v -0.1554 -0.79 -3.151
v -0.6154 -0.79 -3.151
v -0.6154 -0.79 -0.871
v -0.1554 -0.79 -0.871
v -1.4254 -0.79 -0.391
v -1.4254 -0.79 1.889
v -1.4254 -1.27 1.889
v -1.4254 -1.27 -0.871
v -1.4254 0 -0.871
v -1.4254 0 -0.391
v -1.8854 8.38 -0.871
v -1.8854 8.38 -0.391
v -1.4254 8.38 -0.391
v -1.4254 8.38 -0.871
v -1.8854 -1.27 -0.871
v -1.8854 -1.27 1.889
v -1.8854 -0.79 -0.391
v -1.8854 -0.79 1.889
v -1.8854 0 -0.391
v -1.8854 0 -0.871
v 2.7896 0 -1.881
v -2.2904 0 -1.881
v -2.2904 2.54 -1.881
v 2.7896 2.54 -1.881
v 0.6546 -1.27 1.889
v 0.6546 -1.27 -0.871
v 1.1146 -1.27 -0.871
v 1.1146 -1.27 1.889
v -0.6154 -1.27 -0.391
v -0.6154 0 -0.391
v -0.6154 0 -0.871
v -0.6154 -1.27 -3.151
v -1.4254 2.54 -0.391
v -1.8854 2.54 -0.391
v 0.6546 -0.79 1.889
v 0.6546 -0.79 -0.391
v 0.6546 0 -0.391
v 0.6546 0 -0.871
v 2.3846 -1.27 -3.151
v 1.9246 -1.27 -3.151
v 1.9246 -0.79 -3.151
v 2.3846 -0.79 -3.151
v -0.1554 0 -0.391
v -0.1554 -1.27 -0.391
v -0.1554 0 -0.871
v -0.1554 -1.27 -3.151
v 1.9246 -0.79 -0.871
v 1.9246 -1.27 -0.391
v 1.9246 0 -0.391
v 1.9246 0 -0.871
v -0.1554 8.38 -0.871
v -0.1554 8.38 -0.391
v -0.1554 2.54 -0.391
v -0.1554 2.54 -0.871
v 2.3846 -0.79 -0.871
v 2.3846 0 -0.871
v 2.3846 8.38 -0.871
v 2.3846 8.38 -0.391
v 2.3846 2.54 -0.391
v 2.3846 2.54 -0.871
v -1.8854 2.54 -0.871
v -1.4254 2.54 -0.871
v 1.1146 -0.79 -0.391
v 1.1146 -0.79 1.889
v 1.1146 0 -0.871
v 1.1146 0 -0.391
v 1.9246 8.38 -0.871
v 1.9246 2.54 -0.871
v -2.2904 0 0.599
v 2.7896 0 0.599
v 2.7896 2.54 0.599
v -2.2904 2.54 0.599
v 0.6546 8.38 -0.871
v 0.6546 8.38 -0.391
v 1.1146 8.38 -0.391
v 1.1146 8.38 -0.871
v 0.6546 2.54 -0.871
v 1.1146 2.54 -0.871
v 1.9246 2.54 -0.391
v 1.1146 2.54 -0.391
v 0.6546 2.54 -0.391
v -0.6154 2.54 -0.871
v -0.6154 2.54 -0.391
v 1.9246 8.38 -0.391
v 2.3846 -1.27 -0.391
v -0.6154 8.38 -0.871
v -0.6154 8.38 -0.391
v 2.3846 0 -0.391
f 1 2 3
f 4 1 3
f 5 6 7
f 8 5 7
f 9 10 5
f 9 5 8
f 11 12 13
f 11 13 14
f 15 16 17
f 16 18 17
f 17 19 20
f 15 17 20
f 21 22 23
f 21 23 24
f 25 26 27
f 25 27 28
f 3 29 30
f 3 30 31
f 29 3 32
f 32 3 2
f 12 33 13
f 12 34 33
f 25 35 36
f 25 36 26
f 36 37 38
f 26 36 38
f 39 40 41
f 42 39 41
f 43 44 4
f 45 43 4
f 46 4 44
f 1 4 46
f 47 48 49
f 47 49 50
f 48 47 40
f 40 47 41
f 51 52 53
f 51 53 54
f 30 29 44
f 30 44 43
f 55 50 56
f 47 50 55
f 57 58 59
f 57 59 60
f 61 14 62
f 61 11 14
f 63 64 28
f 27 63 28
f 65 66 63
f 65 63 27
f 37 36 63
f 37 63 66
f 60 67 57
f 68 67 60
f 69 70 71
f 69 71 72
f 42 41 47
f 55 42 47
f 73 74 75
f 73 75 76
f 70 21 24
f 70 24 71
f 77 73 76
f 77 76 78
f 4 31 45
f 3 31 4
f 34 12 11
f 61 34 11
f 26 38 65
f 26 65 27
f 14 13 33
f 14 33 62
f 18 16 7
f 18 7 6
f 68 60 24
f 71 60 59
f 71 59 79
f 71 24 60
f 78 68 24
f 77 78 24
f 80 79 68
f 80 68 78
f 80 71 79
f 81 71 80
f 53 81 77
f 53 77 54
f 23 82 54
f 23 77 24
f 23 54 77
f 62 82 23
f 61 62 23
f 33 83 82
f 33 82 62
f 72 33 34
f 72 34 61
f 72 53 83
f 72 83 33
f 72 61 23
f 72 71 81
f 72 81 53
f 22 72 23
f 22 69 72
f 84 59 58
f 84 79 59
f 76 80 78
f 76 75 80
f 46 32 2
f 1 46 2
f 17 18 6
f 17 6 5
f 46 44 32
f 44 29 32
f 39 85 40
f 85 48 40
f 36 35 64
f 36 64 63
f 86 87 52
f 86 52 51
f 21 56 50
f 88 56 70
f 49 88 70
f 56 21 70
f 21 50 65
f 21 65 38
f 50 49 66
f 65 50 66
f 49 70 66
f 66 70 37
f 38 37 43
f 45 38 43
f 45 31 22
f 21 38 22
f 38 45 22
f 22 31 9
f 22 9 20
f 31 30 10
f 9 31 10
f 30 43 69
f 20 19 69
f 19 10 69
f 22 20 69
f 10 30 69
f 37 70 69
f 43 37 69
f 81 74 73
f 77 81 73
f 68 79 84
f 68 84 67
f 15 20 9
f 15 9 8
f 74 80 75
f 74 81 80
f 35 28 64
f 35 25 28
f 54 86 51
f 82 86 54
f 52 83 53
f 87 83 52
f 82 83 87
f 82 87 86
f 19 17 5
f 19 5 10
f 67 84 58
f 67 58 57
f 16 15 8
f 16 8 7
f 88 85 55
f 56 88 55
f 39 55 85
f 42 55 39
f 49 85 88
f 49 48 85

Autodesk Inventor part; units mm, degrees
ref_plane "YZ Plane" through (0, 0, 0) normal (1, 0, 0) x (0, 1, 0)
sketch "Sketch1" plane through (0, 0, 0) normal (0, 1, 0) x (-1, 0, 0)
  line L0 (-2.7896, 0.599) -> (2.2904, 0.599)
  line L1 (2.2904, 0.599) -> (2.2904, -1.881)
  line L2 (2.2904, -1.881) -> (-2.7896, -1.881)
  line L3 (-2.7896, -1.881) -> (-2.7896, 0.599)
  point P0 (0, 0)
  dimension "d0" = 5.08
  dimension "d1" = 2.48
extrude "Extrusion1" add sketch "Sketch1" along normal blind 2.54
ref_plane "Work Plane1" through (2.1546, 0, 0.599) normal (1, 0, 0) x (0, 0, -1)
sketch "Sketch2" plane through (2.1546, 0, 0.599) normal (1, 0, 0) x (0, 0, -1)
  line L0 (0.99, 8.38) -> (1.47, 8.38)
  line L1 (1.47, 8.38) -> (1.47, -0.79)
  line L2 (0.99, -0.142) -> (0.99, 8.38)
  line L3 (3.75, -0.79) -> (1.47, -0.79)
  line L4 (0.99, -0.142) -> (0.99, -1.27)
  line L5 (0.99, -1.27) -> (3.75, -1.27)
  line L6 (3.75, -1.27) -> (3.75, -0.79)
  line L7 (0, 2.54) -> (2.48, 2.54) projected
  line L8 (2.48, 0) -> (0, 0) projected
  line L9 (2.48, 0) -> (2.48, 2.54) projected
  point P0 (0.599, 0)
  dimension "d5" = 0.48
  dimension "d6" = 0.48
  dimension "d7" = 5.84
  dimension "d8" = 1.27
  dimension "d9" = 1.01
  dimension "d10" = 1.27
extrude "Extrusion2" add sketch "Sketch2" along normal mid plane 0.46 contours L0 L1 L7 L2 | L7 L1 L8 L2 | L8 L1 L3 L6 L5 L4 L2
pattern_linear "Rectangular Pattern1" count 2 spacing 2.54 along (-1, 0, 0) of "Extrusion2"
ref_plane "Work Plane2" through (0.8846, 0, 0.599) normal (1, 0, 0) x (0, 0, -1)
sketch "Sketch3" plane through (0.8846, 0, 0.599) normal (1, 0, 0) x (0, 0, -1)
  line L0 (0.99, 8.38) -> (1.47, 8.38)
  line L1 (1.47, 8.38) -> (1.47, -0.79)
  line L2 (0.99, -0.142) -> (0.99, 8.38)
  line L3 (0.99, -0.142) -> (0.99, -0.79)
  line L4 (1.47, 8.38) -> (0.99, 8.38)
  line L5 (0.99, 8.38) -> (0.99, -0.79)
  line L6 (1.47, -0.142) -> (1.47, 8.38)
  line L7 (-1.29, -0.79) -> (0.99, -0.79)
  line L8 (1.47, -0.142) -> (1.47, -1.27)
  line L9 (1.47, -1.27) -> (-1.29, -1.27)
  line L10 (-1.29, -1.27) -> (-1.29, -0.79)
  point P0 (0.599, 0)
  dimension "d18" = 0.48
extrude "Extrusion3" add sketch "Sketch3" along normal mid plane 0.46
pattern_linear "Rectangular Pattern2" count 2 spacing 2.54 along (-1, 0, 0) of "Extrusion3"
properties part number "Header_127"
